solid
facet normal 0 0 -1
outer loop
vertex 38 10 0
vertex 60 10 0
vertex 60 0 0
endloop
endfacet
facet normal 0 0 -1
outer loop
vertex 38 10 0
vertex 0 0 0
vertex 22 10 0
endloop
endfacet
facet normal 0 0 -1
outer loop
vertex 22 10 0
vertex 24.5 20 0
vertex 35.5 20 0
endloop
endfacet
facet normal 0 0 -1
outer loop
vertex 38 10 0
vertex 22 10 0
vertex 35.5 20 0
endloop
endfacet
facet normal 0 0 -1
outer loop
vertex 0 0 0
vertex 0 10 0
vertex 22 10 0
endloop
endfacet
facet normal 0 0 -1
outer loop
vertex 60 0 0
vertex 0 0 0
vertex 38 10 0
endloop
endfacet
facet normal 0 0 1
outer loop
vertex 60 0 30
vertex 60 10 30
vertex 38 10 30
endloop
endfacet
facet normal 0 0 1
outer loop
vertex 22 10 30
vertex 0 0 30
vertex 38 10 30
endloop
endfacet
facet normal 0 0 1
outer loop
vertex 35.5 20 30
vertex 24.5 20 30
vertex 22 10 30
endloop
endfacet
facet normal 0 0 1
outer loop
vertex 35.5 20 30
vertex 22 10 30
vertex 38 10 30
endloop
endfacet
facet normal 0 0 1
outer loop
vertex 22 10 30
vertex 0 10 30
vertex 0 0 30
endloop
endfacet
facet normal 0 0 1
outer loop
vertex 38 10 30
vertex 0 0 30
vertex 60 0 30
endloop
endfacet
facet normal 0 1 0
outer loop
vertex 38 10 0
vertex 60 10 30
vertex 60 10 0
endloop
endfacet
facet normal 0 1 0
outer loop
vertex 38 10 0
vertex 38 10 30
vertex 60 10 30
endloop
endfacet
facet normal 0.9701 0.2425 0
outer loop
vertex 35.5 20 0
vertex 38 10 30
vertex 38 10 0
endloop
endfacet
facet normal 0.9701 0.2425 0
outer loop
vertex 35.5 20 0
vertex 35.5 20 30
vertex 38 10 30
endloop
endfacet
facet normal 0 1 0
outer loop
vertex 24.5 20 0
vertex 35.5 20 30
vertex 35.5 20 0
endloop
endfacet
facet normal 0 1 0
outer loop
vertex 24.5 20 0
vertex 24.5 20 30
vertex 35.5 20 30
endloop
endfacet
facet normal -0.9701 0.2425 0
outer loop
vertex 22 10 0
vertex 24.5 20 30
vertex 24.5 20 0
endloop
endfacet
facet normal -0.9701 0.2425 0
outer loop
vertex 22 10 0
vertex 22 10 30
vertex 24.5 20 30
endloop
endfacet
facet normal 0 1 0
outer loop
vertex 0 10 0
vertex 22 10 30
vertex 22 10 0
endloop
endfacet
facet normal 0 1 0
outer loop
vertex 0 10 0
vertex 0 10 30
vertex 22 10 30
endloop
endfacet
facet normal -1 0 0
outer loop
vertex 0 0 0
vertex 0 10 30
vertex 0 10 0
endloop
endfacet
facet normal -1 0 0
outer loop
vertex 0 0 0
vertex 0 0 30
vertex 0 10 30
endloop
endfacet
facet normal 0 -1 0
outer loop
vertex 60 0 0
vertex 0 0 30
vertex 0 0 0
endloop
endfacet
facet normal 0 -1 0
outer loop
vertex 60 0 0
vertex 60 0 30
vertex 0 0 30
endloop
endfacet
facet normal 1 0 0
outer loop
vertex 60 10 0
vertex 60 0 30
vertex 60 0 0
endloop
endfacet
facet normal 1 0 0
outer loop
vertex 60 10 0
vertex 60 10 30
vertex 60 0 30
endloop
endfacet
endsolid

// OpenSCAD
$fn = 32;

// ----------------------------------------------------------------------
// V guide rail: dovetail, 60 mm wide
// ----------------------------------------------------------------------

// --- parameters (mm) ---
rail_w = 60;              // rail width, X
base_t = 10;              // base plate thickness
v_depth = 10;             // V feature depth / height
v_half_w = 8;             // half width of the V at the base face
plate_t = 30;             // rail length, Z (the extrusion height)
top_half_w = 5.5;         // half width at the dovetail top
fit_tol = 0.02;           // declared fit tolerance (prompt contract)
free_tol = 0.2;           // declared free tolerance (prompt contract)

dovetail_base = 2 * v_half_w;  // dovetail width at the base
dovetail_top = 2 * top_half_w;  // dovetail width at the top

profile = [[0, 0], [60, 0], [60, 10], [38, 10], [35.5, 20], [24.5, 20], [22, 10], [0, 10]];  // primary outline, 8 points, counter clockwise

// --- the one profile operation ---
linear_extrude(height = plate_t) polygon(points = profile);
